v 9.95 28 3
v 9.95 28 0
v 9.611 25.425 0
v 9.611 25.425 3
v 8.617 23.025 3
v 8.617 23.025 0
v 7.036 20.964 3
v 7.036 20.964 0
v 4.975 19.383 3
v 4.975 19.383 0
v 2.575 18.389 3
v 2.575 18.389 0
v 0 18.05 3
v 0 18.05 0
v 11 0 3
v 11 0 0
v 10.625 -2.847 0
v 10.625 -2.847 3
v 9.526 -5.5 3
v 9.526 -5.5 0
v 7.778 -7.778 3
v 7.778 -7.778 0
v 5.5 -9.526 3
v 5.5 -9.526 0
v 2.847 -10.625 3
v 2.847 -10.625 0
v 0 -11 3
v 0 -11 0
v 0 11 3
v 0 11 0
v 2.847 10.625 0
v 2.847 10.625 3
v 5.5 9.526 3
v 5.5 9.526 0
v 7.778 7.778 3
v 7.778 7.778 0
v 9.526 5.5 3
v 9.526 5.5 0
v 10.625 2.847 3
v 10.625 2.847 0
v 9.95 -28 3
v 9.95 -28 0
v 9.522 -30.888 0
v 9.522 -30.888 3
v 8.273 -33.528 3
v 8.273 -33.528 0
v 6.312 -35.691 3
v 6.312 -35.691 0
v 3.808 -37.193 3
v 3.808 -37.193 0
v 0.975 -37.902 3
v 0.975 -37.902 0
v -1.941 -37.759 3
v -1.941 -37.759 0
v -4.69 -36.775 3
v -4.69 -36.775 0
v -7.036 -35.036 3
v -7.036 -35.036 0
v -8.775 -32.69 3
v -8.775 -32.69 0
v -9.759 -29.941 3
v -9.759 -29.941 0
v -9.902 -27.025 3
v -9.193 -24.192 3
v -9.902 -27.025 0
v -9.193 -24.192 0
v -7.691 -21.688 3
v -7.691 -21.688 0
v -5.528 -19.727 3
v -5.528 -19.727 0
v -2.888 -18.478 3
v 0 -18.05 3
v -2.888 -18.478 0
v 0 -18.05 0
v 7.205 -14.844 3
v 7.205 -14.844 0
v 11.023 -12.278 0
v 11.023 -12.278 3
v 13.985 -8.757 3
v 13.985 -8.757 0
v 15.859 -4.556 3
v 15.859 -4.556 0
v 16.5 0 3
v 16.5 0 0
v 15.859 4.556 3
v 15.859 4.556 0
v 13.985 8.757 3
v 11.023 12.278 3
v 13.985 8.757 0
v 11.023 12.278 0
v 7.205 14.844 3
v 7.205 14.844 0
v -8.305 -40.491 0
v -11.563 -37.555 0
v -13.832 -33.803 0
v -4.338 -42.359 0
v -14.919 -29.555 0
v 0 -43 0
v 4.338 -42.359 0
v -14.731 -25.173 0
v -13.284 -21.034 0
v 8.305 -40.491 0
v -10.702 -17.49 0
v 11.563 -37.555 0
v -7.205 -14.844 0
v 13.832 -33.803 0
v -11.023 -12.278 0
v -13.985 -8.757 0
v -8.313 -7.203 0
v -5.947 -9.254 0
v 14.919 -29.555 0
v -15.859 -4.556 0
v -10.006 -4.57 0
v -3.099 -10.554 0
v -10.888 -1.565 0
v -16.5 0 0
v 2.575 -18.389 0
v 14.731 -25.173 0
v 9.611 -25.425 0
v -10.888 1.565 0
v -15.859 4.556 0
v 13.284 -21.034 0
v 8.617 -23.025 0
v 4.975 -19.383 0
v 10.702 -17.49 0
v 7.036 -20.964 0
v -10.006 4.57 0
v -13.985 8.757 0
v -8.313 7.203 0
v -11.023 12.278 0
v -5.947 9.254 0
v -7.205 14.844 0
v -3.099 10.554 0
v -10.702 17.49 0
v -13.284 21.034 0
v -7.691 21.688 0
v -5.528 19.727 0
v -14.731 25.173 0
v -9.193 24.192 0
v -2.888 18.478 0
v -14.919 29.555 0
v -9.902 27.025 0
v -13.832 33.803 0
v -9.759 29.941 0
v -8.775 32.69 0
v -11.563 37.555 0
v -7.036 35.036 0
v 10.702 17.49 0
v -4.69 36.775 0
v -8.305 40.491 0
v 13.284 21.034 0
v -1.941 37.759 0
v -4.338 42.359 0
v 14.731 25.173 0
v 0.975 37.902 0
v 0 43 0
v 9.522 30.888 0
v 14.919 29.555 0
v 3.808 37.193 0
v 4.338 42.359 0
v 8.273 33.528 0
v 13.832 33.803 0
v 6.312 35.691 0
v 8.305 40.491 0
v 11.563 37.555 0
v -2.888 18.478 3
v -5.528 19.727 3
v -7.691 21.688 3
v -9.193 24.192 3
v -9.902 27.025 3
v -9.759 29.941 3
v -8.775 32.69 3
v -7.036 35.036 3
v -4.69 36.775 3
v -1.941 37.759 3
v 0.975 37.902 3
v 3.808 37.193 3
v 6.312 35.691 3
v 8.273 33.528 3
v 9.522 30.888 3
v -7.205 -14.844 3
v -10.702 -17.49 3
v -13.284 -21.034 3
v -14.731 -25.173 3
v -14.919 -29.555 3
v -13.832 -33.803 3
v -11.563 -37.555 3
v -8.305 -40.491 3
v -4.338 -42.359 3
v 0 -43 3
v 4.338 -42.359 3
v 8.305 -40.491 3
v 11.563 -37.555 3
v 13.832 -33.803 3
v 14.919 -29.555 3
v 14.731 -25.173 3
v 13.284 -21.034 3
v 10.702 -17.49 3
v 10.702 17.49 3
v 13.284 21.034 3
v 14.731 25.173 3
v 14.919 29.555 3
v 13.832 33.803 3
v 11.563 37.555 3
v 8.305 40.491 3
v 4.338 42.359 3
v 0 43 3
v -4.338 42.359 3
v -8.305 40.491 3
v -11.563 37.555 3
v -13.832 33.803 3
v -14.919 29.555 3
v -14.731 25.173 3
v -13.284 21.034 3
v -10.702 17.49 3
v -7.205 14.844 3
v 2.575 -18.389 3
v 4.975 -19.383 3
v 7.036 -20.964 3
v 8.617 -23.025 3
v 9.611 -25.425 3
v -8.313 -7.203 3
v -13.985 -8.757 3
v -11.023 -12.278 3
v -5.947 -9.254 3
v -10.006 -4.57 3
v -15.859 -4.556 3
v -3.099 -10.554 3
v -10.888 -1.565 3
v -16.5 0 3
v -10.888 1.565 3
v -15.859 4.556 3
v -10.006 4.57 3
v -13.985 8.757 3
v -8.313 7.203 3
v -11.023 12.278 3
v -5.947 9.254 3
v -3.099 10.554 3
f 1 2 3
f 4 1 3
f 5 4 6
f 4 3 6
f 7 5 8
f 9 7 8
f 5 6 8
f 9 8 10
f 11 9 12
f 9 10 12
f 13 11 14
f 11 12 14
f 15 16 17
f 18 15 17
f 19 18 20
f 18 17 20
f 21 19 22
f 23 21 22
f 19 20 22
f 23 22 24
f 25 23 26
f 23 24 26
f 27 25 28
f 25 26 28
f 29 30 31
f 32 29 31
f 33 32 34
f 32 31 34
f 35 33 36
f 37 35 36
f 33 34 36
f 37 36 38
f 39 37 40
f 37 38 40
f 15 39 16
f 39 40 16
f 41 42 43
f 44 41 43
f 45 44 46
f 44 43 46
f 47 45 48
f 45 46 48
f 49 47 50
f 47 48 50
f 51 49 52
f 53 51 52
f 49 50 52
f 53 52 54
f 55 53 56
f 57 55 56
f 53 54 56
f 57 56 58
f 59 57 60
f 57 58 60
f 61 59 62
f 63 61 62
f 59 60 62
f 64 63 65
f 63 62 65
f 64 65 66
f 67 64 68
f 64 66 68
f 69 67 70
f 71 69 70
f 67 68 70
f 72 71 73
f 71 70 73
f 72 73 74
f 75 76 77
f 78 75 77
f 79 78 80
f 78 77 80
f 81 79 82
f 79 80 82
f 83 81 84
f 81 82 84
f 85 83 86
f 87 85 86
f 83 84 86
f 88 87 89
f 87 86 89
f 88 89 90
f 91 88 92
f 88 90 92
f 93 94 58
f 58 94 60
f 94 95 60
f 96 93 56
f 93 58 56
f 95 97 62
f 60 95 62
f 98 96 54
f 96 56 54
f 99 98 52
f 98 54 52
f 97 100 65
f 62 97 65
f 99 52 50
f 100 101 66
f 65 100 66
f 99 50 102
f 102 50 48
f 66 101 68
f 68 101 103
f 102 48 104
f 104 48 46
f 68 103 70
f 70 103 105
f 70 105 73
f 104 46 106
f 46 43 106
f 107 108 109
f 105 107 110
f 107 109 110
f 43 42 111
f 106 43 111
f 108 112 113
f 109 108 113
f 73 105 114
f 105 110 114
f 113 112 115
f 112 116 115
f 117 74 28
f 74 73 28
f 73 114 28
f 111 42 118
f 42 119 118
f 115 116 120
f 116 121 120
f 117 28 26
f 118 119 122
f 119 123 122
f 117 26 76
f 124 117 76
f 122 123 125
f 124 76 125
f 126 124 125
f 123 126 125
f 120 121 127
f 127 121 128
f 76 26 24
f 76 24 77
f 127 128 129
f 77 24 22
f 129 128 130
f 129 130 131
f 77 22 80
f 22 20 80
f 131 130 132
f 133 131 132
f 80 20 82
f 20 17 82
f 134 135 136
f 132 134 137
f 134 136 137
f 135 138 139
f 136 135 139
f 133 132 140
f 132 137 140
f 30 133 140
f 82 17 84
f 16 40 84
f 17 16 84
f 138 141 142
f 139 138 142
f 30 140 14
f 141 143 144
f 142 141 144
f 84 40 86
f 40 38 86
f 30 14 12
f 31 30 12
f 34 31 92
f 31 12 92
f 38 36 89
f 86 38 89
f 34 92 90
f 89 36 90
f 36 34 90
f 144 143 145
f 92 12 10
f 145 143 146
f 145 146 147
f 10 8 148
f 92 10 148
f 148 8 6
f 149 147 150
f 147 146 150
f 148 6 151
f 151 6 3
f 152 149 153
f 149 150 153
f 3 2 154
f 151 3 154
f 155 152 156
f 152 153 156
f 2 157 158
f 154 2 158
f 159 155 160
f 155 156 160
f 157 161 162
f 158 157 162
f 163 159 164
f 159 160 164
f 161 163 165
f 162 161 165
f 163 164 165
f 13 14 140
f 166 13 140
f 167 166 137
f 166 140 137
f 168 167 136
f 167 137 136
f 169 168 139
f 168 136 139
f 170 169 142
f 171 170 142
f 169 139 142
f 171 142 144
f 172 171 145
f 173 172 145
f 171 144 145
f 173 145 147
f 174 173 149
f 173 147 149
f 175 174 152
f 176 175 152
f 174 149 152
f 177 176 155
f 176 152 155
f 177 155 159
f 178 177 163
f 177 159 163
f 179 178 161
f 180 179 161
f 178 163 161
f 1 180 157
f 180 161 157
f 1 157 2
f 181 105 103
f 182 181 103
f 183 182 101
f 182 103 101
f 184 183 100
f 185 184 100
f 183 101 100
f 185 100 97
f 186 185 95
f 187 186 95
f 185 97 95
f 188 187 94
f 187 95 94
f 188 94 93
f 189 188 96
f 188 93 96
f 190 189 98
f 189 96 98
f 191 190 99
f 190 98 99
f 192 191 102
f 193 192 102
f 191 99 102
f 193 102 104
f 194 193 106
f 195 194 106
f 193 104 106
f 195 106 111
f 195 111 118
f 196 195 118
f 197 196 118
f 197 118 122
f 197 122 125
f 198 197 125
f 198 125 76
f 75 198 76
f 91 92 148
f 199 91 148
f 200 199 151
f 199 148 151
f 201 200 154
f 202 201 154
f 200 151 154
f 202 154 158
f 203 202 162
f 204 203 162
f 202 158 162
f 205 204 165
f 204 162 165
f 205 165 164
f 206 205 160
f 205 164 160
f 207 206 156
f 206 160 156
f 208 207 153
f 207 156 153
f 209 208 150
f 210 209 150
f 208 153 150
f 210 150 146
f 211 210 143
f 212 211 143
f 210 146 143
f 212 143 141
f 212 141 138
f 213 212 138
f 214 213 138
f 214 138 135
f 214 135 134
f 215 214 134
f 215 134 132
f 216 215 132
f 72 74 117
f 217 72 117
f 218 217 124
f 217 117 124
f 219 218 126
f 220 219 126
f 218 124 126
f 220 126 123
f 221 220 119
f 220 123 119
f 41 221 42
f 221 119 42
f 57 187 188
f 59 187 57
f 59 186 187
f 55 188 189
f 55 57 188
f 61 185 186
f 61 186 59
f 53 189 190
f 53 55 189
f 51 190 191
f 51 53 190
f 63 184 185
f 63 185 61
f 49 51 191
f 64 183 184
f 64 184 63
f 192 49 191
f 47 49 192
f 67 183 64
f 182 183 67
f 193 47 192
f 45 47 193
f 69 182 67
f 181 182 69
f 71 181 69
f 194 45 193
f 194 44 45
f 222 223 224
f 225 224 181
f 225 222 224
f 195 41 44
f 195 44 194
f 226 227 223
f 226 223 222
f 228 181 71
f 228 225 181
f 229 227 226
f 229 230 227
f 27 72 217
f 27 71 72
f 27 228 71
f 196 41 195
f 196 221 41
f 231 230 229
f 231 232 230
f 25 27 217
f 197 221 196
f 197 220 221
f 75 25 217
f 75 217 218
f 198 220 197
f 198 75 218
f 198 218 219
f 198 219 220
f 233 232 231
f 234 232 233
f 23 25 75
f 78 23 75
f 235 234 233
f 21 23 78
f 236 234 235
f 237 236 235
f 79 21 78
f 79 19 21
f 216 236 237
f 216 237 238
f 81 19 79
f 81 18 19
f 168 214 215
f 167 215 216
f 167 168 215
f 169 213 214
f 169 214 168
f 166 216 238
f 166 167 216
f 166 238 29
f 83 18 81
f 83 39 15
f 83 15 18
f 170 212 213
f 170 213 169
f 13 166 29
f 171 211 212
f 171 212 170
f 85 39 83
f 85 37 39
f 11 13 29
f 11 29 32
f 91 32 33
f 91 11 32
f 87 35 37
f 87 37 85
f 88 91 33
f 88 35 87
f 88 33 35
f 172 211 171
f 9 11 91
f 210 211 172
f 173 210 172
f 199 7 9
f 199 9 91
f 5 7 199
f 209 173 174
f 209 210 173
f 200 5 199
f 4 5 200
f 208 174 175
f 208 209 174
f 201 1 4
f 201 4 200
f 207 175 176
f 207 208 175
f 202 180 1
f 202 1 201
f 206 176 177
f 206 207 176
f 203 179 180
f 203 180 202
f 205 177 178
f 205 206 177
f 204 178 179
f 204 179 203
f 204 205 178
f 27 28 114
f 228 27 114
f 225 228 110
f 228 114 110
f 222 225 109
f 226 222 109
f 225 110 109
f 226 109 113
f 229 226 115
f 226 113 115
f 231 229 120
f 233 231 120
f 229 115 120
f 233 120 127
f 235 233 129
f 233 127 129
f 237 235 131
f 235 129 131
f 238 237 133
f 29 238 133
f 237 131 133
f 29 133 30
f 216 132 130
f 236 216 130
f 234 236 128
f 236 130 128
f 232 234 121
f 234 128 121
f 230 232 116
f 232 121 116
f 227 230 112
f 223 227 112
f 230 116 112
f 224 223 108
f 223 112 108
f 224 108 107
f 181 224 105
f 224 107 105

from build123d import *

# Parameters (mm, degrees)
F1_DEPTH = 3


with BuildPart() as f1:
    # F0 (on Top) → F1 (new body)
    with BuildSketch(Plane.XY):
        with BuildLine():
            ThreePointArc((7.205074, 14.84375), (0, 43), (-7.205074, 14.84375))
            ThreePointArc((-7.205074, 14.84375), (-16.5, 0), (-7.205074, -14.84375))
            ThreePointArc((-7.205074, -14.84375), (0, -43), (7.205074, -14.84375))
            ThreePointArc((7.205074, -14.84375), (16.5, 0), (7.205074, 14.84375))
        make_face()
        with BuildLine():
            ThreePointArc((9.95, -28), (-7.035712, -35.035712), (0, -18.05))
            ThreePointArc((0, -18.05), (7.035712, -20.964288), (9.95, -28))
        make_face(mode=Mode.SUBTRACT)
        with BuildLine():
            ThreePointArc((0, 11), (7.778175, 7.778175), (11, 0))
            ThreePointArc((11, 0), (7.778175, -7.778175), (0, -11))
            ThreePointArc((0, -11), (-11, 0), (0, 11))
        make_face(mode=Mode.SUBTRACT)
        with BuildLine():
            ThreePointArc((9.95, 28), (7.035712, 20.964288), (0, 18.05))
            ThreePointArc((0, 18.05), (-7.035712, 35.035712), (9.95, 28))
        make_face(mode=Mode.SUBTRACT)
    extrude(amount=F1_DEPTH)


solid = f1.part
